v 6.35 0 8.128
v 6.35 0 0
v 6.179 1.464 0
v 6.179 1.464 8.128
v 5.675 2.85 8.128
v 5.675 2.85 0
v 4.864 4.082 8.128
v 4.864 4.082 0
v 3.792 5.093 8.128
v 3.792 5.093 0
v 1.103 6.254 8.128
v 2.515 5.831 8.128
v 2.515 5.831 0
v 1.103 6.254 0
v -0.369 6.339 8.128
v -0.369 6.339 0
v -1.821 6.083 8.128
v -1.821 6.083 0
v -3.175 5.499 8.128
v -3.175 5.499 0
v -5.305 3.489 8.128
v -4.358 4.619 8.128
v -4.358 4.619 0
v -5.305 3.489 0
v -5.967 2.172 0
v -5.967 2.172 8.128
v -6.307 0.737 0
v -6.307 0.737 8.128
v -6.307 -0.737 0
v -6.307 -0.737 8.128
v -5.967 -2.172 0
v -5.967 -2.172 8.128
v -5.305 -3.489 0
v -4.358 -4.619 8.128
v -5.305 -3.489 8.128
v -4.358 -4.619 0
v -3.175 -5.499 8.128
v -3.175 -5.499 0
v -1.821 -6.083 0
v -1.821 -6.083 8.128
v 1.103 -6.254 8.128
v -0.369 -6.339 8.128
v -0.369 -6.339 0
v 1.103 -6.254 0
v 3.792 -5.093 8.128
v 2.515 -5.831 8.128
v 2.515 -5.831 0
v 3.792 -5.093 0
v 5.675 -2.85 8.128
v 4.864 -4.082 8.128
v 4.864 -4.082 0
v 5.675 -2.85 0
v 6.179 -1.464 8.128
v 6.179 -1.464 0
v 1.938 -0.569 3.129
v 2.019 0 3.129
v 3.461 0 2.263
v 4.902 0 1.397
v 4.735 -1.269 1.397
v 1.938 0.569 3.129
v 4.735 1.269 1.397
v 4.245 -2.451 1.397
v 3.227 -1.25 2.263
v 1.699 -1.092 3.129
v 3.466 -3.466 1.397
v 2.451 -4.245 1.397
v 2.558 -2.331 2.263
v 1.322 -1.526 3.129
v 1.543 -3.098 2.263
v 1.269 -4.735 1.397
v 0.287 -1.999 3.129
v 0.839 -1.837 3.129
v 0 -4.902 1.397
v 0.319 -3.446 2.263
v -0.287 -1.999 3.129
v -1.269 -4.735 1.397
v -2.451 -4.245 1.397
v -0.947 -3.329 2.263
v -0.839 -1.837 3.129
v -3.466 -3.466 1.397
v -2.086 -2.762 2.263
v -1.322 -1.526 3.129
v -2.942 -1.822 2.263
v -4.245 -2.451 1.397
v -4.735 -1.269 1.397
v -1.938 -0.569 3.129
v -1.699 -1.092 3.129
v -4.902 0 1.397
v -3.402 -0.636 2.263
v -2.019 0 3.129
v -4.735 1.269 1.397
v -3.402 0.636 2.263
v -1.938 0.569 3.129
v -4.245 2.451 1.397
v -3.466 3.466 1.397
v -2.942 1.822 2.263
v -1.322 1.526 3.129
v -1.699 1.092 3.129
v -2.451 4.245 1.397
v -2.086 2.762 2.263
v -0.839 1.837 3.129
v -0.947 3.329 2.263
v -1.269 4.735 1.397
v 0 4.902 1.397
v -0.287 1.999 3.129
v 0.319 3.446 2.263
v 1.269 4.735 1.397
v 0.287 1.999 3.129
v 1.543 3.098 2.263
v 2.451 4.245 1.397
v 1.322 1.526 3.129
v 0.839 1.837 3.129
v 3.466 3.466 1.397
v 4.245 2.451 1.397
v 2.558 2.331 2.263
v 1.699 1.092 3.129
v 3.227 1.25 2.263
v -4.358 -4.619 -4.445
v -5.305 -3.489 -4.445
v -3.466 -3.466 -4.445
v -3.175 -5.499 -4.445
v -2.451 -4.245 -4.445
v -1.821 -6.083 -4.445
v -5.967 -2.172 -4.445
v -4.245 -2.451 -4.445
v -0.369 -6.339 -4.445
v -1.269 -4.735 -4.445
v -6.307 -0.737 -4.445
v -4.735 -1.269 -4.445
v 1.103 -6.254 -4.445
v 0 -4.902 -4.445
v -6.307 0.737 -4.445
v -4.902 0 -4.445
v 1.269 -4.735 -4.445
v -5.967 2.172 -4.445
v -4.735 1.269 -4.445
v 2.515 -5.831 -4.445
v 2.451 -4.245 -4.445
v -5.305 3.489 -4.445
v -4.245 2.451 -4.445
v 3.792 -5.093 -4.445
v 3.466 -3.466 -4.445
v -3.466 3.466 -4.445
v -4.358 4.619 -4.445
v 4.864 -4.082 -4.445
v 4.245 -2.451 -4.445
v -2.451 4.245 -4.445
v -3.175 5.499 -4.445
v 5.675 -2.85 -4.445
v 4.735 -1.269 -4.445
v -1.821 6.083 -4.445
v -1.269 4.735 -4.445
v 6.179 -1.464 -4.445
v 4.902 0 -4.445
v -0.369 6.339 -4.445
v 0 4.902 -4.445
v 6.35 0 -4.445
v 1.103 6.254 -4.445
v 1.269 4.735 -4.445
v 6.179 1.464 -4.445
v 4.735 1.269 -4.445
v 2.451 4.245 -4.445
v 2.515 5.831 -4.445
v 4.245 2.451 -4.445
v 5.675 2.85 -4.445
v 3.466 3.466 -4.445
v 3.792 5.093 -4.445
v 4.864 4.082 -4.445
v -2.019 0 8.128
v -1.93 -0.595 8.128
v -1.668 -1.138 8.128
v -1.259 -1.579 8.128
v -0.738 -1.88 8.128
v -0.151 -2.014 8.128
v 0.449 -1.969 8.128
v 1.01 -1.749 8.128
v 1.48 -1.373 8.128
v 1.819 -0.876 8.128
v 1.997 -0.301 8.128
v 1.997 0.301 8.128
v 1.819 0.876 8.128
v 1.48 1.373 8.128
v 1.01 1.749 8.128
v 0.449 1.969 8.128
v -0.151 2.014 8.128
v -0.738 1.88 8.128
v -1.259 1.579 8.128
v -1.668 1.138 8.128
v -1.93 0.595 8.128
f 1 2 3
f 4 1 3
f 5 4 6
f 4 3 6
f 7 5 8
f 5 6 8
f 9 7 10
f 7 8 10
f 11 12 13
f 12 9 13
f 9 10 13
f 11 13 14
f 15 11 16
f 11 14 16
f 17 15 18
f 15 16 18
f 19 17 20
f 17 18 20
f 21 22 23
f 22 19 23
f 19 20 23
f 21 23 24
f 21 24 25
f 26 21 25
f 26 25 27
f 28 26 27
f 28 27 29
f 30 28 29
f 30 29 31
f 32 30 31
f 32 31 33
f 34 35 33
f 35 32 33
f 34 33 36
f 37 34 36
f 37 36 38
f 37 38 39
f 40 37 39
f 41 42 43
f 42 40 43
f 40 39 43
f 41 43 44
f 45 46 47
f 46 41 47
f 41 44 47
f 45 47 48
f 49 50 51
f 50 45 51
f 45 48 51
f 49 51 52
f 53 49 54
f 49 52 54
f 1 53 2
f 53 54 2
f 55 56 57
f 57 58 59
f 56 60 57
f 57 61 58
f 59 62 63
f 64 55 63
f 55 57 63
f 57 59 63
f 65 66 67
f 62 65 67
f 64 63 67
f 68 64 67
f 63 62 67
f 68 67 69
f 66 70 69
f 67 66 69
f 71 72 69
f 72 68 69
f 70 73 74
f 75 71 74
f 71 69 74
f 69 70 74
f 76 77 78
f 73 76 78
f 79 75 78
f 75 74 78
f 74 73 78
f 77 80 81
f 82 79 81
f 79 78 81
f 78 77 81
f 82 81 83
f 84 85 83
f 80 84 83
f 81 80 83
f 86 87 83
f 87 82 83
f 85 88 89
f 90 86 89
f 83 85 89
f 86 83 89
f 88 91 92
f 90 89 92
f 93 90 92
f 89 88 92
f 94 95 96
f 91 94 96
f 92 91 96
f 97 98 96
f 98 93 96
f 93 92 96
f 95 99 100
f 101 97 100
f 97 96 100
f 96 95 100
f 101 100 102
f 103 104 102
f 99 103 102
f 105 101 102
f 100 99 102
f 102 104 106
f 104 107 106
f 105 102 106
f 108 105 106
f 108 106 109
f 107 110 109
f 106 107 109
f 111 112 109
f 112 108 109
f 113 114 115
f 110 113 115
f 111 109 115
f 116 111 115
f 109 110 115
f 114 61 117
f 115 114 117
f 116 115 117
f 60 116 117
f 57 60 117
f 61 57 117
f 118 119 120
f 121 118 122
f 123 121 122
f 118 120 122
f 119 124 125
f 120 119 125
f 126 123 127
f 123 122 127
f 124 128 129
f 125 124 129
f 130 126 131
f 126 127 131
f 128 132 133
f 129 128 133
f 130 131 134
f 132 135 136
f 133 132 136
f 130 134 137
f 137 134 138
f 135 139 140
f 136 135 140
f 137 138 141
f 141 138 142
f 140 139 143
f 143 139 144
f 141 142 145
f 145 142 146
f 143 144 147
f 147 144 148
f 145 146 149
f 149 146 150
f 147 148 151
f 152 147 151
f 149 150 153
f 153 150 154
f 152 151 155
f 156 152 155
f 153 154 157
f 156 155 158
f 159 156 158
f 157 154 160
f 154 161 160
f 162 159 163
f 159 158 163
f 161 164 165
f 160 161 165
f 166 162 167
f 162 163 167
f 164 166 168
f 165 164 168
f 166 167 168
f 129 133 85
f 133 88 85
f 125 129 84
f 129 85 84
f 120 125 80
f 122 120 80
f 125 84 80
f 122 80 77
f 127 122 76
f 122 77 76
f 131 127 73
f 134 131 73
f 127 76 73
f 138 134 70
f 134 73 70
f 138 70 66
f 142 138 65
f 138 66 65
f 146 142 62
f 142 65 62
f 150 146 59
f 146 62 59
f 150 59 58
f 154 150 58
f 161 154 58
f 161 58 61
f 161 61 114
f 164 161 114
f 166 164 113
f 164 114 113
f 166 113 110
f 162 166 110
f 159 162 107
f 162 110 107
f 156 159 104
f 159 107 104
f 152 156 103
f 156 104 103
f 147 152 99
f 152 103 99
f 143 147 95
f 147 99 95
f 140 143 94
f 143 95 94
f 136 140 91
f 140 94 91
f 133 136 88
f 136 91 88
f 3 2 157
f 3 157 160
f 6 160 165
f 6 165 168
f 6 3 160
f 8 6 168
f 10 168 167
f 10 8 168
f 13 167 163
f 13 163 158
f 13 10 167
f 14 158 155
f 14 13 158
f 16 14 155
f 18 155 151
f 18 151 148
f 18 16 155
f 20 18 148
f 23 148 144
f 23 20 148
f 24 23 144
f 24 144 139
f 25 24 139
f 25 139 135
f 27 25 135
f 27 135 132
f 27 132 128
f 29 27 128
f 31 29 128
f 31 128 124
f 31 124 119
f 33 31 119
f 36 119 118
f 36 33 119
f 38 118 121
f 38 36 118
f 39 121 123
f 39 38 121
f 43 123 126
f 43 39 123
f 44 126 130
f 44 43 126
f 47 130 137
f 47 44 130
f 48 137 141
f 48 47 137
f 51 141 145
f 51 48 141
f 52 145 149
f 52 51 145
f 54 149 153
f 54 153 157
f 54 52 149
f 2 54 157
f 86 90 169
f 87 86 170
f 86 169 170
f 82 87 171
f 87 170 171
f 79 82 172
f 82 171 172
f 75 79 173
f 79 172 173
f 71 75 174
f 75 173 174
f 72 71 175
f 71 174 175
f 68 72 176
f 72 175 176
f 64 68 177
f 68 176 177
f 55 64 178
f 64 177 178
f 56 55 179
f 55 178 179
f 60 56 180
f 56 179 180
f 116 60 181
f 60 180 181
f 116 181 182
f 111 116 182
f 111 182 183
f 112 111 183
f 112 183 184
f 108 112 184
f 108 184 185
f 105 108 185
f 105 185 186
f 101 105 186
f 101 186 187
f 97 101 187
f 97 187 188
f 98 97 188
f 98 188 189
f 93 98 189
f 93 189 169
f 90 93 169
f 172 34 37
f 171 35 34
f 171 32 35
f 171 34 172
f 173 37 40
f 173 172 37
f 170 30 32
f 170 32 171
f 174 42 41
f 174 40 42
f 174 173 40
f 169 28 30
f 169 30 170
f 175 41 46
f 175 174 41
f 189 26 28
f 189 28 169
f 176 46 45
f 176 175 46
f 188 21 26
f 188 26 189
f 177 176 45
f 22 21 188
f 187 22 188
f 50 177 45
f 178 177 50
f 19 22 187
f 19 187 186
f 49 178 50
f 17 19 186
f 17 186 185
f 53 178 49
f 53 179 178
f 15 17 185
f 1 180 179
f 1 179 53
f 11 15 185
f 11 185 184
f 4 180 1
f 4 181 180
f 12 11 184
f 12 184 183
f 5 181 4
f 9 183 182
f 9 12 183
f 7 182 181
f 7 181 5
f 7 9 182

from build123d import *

# Parameters (mm, degrees)
F2_R      = 6.35
F3_DEPTH  = 4.445
F4_R      = 9.525
F5_DEPTH  = 8.128
F6_W      = 38.1
F6_H      = 14.9352
F8_DEPTH  = 25.4
F9_D      = 9.8044
F9_DEPTH  = 5.842
F9_TIP    = 2.9455389266
F10_D     = 4.0386
F11_R     = 22.559553958
F11_R_2   = 6.35
F12_DEPTH = 25.4


with BuildPart() as f3:
    # F2 (on Top) → F3 (new body, through all)
    with BuildSketch(Plane.XY):
        Circle(F2_R)
    extrude(amount=-F3_DEPTH)

    # F4 (on Top) → F5 (join, through all)
    with BuildSketch(Plane.XY):
        Circle(F4_R)
    extrude(amount=F5_DEPTH)

    # F6 (on Top) → F8 (cut)
    with BuildSketch(Plane.XY):
        with Locations((0, -14.9352)):
            Rectangle(F6_W, F6_H)
        with Locations((0, 14.9352)):
            Rectangle(F6_W, F6_H)
    extrude(amount=F8_DEPTH, mode=Mode.SUBTRACT)

    # F9
    with Locations(Plane(origin=(0, 0, -4.445), x_dir=(1, 0, 0), z_dir=(0, 0, -1))):
        with Locations((0, 0)):
            Hole(F9_D / 2, depth=F9_DEPTH)
            with Locations((0, 0, -(F9_DEPTH + F9_TIP / 2))):  # 118° drill point
                Cone(0, F9_D / 2, F9_TIP, mode=Mode.SUBTRACT)

    # F10 (through all)
    with Locations(Plane(origin=(0, 0, -4.445), x_dir=(1, 0, 0), z_dir=(0, 0, -1))):
        with Locations((0, 0)):
            Hole(F10_D / 2)

    # F11 (on offset) → F12 (cut)
    with BuildSketch(Plane.XY.offset(-4.445)):
        Circle(F11_R)
        Circle(F11_R_2, mode=Mode.SUBTRACT)
    extrude(amount=F12_DEPTH, mode=Mode.SUBTRACT)


solid = f3.part
